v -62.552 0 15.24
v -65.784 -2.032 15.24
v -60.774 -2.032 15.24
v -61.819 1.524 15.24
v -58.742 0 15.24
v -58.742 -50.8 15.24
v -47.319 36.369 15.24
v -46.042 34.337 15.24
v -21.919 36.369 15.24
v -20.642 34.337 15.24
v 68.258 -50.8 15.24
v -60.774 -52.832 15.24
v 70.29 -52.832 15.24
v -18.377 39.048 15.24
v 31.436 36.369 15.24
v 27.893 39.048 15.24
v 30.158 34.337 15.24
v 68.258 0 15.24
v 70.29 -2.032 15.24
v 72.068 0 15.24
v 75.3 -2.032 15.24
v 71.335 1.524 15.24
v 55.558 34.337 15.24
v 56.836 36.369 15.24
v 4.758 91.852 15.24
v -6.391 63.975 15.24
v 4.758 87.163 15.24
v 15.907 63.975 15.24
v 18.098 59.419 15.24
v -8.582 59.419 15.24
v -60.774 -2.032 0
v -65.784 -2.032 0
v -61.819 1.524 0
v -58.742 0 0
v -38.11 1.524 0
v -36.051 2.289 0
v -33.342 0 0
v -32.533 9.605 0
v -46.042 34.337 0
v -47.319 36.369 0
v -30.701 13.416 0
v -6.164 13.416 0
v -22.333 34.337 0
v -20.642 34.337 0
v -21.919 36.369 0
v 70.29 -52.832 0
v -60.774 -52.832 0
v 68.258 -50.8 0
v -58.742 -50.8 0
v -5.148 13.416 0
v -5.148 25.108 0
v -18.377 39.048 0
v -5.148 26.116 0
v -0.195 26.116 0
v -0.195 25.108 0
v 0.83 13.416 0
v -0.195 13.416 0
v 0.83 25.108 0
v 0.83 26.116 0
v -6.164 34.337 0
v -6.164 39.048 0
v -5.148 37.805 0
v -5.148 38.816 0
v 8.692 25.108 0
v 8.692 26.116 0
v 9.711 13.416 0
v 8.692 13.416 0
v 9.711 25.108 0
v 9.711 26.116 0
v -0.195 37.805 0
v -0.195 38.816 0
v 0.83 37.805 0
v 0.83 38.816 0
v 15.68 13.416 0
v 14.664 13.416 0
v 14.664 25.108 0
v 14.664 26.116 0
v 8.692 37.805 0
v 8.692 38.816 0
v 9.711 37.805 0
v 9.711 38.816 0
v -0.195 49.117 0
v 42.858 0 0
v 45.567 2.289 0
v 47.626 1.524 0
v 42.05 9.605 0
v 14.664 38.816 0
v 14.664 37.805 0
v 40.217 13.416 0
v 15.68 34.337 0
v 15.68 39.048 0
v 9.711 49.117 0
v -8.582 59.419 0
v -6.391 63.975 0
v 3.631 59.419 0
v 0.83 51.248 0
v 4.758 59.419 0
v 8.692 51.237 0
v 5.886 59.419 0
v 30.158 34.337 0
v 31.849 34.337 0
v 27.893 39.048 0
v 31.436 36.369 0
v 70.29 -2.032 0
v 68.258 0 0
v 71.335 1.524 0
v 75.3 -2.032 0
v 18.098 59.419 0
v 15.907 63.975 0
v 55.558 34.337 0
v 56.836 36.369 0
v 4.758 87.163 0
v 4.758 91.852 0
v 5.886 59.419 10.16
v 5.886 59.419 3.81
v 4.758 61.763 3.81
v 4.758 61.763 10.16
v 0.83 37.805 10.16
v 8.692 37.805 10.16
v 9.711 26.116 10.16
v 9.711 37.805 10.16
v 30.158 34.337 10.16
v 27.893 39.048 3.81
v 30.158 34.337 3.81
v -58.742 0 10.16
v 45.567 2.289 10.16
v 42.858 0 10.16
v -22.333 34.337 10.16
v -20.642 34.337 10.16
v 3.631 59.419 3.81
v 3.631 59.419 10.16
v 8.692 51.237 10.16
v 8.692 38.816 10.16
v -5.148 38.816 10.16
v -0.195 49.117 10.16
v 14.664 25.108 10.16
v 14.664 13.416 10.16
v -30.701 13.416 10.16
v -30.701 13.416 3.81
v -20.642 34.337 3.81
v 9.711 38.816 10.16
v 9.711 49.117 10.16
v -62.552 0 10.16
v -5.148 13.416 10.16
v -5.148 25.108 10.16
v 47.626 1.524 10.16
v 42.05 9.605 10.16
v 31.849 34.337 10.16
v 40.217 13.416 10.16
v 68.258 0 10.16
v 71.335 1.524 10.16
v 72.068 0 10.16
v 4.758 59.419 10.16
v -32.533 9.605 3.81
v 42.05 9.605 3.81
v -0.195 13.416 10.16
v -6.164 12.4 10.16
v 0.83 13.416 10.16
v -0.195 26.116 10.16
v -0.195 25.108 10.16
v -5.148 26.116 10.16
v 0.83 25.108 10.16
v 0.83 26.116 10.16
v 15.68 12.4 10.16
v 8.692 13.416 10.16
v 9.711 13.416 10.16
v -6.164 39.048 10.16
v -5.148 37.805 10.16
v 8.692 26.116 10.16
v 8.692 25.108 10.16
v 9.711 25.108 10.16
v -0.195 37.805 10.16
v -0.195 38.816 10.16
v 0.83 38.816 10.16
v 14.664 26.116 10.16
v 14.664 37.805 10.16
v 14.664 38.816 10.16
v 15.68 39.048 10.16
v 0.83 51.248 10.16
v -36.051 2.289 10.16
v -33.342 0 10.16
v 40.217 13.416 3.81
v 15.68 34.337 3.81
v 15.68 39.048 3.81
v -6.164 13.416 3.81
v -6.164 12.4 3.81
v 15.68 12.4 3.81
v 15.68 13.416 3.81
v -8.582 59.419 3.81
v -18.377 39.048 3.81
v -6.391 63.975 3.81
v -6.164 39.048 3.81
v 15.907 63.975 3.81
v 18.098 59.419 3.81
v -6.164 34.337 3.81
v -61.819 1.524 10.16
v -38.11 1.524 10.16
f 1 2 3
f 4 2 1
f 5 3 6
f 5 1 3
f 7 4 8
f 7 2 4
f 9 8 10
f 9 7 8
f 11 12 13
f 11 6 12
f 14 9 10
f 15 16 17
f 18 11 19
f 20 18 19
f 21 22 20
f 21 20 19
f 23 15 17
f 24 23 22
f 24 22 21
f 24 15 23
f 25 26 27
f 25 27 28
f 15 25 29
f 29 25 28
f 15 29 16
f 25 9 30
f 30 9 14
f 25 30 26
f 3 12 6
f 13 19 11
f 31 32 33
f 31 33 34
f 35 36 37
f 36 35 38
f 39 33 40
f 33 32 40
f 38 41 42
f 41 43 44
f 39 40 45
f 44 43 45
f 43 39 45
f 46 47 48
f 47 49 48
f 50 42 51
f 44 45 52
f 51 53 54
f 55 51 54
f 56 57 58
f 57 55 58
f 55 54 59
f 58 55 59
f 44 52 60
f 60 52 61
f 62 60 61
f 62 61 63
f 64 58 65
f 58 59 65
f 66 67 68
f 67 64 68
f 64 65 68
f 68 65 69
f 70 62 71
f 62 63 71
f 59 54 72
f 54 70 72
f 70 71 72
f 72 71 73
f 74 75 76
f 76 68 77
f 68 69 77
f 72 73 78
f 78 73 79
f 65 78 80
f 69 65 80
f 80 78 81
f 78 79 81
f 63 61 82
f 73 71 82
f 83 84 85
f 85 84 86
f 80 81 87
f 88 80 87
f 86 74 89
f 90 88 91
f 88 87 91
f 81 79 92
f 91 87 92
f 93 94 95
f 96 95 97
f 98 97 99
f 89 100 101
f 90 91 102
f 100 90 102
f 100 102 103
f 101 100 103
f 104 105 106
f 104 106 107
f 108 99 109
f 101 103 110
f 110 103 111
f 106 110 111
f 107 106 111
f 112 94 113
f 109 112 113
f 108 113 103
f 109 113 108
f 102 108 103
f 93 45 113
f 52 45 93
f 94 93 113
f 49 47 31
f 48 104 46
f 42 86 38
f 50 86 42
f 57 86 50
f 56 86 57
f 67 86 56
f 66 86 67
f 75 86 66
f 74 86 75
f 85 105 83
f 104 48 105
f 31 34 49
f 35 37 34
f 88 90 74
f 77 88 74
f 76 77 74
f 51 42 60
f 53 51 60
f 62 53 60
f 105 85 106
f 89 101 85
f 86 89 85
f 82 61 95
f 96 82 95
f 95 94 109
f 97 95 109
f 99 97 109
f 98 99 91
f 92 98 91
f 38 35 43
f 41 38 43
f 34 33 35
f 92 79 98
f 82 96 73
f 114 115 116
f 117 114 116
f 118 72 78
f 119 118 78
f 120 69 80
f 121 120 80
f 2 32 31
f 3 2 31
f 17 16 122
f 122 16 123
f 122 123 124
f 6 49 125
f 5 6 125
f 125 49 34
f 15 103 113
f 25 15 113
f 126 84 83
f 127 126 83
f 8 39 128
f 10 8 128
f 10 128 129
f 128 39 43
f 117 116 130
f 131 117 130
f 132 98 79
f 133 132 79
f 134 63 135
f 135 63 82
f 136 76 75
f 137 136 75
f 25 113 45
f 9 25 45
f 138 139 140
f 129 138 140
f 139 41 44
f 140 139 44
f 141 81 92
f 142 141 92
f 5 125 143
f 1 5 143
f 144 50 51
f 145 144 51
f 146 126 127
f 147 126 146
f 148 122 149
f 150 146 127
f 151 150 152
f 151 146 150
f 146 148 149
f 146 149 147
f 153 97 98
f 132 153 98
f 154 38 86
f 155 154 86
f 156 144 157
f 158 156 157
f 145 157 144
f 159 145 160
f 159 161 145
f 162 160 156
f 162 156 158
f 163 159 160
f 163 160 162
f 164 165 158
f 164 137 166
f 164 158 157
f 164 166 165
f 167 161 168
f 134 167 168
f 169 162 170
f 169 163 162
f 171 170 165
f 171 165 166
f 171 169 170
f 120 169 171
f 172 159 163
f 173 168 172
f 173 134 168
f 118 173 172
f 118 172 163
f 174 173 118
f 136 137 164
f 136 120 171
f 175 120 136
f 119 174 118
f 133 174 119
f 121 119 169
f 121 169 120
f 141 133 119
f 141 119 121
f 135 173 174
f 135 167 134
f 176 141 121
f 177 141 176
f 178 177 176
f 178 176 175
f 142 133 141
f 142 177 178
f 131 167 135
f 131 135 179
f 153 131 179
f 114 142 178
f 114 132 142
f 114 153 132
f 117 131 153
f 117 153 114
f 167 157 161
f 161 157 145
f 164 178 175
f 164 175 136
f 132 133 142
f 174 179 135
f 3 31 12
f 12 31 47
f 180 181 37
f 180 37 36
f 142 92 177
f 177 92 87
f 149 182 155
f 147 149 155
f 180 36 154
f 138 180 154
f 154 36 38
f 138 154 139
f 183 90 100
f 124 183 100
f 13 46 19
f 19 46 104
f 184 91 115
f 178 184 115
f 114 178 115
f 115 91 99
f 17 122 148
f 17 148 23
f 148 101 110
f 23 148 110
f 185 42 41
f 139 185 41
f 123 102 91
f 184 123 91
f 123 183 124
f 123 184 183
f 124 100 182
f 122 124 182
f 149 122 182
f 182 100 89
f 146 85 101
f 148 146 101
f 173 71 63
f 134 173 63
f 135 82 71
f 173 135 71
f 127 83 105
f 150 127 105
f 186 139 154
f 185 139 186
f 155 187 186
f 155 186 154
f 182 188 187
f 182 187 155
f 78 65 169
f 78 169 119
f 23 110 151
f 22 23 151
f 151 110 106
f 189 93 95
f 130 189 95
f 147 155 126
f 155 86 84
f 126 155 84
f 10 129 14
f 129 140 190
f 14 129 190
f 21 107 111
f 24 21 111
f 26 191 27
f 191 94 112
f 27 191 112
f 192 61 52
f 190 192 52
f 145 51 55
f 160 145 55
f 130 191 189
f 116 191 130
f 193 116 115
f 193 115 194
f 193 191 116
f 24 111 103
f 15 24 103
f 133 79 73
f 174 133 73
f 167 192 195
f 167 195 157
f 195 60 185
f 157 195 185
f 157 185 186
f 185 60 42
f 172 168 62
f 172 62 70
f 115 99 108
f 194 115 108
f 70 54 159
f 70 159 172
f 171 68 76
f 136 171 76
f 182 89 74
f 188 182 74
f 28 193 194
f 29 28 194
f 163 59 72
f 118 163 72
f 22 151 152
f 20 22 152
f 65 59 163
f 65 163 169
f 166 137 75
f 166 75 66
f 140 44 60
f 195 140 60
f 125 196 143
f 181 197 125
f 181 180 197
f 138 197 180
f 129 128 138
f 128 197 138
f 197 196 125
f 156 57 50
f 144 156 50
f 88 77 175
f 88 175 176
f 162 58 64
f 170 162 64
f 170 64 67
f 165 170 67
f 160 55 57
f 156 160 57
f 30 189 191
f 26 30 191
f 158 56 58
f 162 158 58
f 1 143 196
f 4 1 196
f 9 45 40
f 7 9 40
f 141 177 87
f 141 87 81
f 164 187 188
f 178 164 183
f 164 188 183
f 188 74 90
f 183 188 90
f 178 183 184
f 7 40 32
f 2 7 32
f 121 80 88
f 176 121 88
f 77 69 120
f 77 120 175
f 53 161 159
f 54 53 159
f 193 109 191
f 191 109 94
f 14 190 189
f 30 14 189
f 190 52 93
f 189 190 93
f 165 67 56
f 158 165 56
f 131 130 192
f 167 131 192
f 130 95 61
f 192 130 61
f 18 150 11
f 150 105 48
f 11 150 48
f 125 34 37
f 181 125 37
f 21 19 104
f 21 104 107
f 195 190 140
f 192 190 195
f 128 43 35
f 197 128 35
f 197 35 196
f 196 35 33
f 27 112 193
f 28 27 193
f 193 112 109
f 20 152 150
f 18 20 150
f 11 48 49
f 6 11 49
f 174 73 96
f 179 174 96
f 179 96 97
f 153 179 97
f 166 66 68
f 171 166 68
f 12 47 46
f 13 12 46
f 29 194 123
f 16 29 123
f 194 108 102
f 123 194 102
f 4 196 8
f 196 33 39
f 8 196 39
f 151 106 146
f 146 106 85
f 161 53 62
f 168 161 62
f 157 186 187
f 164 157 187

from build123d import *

# Parameters (mm, degrees)
F1_DEPTH = 15.24
F2_DEPTH = 10.16
F0_W     = 4.953
F0_H     = 11.6882068259
F0_W_2   = 7.8621185967
F3_DEPTH = 10.16
F4_DEPTH = 3.81


# Not quite as in the source:
# - a feature names something its author has since deleted; it is built from what else it names


with BuildPart() as f1:
    # F0 (on Top) → F1 (new body)
    with BuildSketch(Plane.XY):
        Polygon((56.8358146836, 36.3690045497), (31.4358146836, 36.3690045497), (4.7581588602, 91.852396227), (-21.9194969632, 36.3690045497), (-23.4601999485, 36.3690045497), (-47.3194969632, 36.3690045497), (-63.1618590029, 3.4205332163), (-65.7835588108, -2.0319997298), (-60.7738408696, -2.0319997298), (-60.7738408696, -52.8319997298), (70.29015859, -52.8319997298), (70.29015859, -2.0319997298), (75.2998765312, -2.0319997298), (72.6781767233, 3.4205332163), align=None)
        Polygon((68.2581588602, -50.8), (-58.7418411398, -50.8), (-58.7418411398, 0), (-62.5518411398, 0), (-61.8190678495, 1.524), (-46.0418411398, 34.3370048199), (-22.332856425, 34.3370048199), (-20.6418411398, 34.3370048199), (-18.376729311, 39.0479167388), (-8.5820728345, 59.4185506966), (-6.3910428531, 63.9753894023), (4.7581588602, 87.1631660812), (15.9073605735, 63.9753894023), (18.0983905549, 59.4185506966), (27.8930470314, 39.0479167388), (30.1581588602, 34.3370048199), (31.8491741455, 34.3370048199), (55.5581588602, 34.3370048199), (71.3353855699, 1.524), (72.0681588602, 0), (68.2581588602, 0), align=None, mode=Mode.SUBTRACT)
    extrude(amount=F1_DEPTH)

    # F0 (on Top) → F2 (join)
    with BuildSketch(Plane.XY):
        Polygon((-62.5518411398, 0), (-58.7418411398, 0), (-33.3418411398, 0), (-36.0511744731, 2.2891336547), (-32.5333754715, 9.6053469359), (-30.7009610057, 13.4163478047), (-20.6418411398, 34.3370048199), (-22.332856425, 34.3370048199), (-38.1100831348, 1.524), (-58.7418411398, 1.524), (-61.8190678495, 1.524), align=None)
        Polygon((42.8581588602, 0), (68.2581588602, 0), (72.0681588602, 0), (71.3353855699, 1.524), (68.2581588602, 1.524), (47.6264008552, 1.524), (31.8491741455, 34.3370048199), (30.1581588602, 34.3370048199), (40.2172787262, 13.4163478047), (42.0496931919, 9.6053469359), (45.5674921935, 2.2891336547), align=None)
    extrude(amount=F2_DEPTH)



with BuildPart() as f3:
    # F0 (on Top) → F3 (new body)
    with BuildSketch(Plane.XY):
        Polygon((-6.1638411398, 34.3370048199), (-6.1638411398, 13.4163478047), (-5.1478411398, 13.4163478047), (-5.1478411398, 25.1078879876), (-0.1948411398, 25.1078879876), (-0.1948411398, 13.4163478047), (0.8297724999, 13.4163478047), (0.8297724999, 25.1078879876), (8.6918910965, 25.1078879876), (8.6918910965, 13.4163478047), (9.7111588602, 13.4163478047), (9.7111588602, 25.1078879876), (14.6641588602, 25.1078879876), (14.6641588602, 13.4163478047), (15.6801588602, 13.4163478047), (15.6801588602, 34.3370048199), (15.6801588602, 39.0479167388), (5.8855023837, 59.4185506966), (4.7581588602, 59.4185506966), (3.6308153367, 59.4185506966), (-6.1638411398, 39.0479167388), align=None)
        with Locations((-2.6713411398, 31.9604512176)):
            Rectangle(F0_W, F0_H, mode=Mode.SUBTRACT)
        Polygon((-5.1478411398, 38.8163478047), (-0.1948411398, 49.1174492506), (-0.1948411398, 38.8163478047), align=None, mode=Mode.SUBTRACT)
        with Locations((4.7608317982, 31.9604512176)):
            Rectangle(F0_W_2, F0_H, mode=Mode.SUBTRACT)
        with Locations((12.1876588602, 31.9604512176)):
            Rectangle(F0_W, F0_H, mode=Mode.SUBTRACT)
        Polygon((9.7111588602, 49.1174492506), (14.6641588602, 38.8163478047), (9.7111588602, 38.8163478047), align=None, mode=Mode.SUBTRACT)
        Polygon((0.8297724999, 51.2484100915), (4.7581588602, 59.4185506966), (8.6918910965, 51.2372918984), (8.6918910965, 38.8163478047), (0.8297724999, 38.8163478047), align=None, mode=Mode.SUBTRACT)
        Polygon((4.7581588602, 61.7631660812), (3.6308153367, 59.4185506966), (4.7581588602, 59.4185506966), (5.8855023837, 59.4185506966), align=None)
        Polygon((-5.1478411398, 13.4163478047), (-6.1638411398, 13.4163478047), (-6.1638411398, 12.4003478047), (15.6801588602, 12.4003478047), (15.6801588602, 13.4163478047), (14.6641588602, 13.4163478047), (9.7111588602, 13.4163478047), (8.6918910965, 13.4163478047), (0.8297724999, 13.4163478047), (-0.1948411398, 13.4163478047), align=None)
    extrude(amount=F3_DEPTH)


with BuildPart() as f1_1:
    add(f1.part)

    add(f3.part)  # F4 merges F3
    # F0 (on Top) → F4 (join)
    with BuildSketch(Plane.XY):
        Polygon((-30.7009610057, 13.4163478047), (-32.5333754715, 9.6053469359), (42.0496931919, 9.6053469359), (40.2172787262, 13.4163478047), (15.6801588602, 13.4163478047), (15.6801588602, 12.4003478047), (-6.1638411398, 12.4003478047), (-6.1638411398, 13.4163478047), align=None)
        Polygon((-18.376729311, 39.0479167388), (-20.6418411398, 34.3370048199), (-6.1638411398, 34.3370048199), (-6.1638411398, 39.0479167388), align=None)
        Polygon((15.6801588602, 34.3370048199), (30.1581588602, 34.3370048199), (27.8930470314, 39.0479167388), (15.6801588602, 39.0479167388), align=None)
        Polygon((-6.3910428531, 63.9753894023), (-8.5820728345, 59.4185506966), (3.6308153367, 59.4185506966), (4.7581588602, 61.7631660812), (5.8855023837, 59.4185506966), (18.0983905549, 59.4185506966), (15.9073605735, 63.9753894023), align=None)
    extrude(amount=F4_DEPTH)


solid = f1_1.part
